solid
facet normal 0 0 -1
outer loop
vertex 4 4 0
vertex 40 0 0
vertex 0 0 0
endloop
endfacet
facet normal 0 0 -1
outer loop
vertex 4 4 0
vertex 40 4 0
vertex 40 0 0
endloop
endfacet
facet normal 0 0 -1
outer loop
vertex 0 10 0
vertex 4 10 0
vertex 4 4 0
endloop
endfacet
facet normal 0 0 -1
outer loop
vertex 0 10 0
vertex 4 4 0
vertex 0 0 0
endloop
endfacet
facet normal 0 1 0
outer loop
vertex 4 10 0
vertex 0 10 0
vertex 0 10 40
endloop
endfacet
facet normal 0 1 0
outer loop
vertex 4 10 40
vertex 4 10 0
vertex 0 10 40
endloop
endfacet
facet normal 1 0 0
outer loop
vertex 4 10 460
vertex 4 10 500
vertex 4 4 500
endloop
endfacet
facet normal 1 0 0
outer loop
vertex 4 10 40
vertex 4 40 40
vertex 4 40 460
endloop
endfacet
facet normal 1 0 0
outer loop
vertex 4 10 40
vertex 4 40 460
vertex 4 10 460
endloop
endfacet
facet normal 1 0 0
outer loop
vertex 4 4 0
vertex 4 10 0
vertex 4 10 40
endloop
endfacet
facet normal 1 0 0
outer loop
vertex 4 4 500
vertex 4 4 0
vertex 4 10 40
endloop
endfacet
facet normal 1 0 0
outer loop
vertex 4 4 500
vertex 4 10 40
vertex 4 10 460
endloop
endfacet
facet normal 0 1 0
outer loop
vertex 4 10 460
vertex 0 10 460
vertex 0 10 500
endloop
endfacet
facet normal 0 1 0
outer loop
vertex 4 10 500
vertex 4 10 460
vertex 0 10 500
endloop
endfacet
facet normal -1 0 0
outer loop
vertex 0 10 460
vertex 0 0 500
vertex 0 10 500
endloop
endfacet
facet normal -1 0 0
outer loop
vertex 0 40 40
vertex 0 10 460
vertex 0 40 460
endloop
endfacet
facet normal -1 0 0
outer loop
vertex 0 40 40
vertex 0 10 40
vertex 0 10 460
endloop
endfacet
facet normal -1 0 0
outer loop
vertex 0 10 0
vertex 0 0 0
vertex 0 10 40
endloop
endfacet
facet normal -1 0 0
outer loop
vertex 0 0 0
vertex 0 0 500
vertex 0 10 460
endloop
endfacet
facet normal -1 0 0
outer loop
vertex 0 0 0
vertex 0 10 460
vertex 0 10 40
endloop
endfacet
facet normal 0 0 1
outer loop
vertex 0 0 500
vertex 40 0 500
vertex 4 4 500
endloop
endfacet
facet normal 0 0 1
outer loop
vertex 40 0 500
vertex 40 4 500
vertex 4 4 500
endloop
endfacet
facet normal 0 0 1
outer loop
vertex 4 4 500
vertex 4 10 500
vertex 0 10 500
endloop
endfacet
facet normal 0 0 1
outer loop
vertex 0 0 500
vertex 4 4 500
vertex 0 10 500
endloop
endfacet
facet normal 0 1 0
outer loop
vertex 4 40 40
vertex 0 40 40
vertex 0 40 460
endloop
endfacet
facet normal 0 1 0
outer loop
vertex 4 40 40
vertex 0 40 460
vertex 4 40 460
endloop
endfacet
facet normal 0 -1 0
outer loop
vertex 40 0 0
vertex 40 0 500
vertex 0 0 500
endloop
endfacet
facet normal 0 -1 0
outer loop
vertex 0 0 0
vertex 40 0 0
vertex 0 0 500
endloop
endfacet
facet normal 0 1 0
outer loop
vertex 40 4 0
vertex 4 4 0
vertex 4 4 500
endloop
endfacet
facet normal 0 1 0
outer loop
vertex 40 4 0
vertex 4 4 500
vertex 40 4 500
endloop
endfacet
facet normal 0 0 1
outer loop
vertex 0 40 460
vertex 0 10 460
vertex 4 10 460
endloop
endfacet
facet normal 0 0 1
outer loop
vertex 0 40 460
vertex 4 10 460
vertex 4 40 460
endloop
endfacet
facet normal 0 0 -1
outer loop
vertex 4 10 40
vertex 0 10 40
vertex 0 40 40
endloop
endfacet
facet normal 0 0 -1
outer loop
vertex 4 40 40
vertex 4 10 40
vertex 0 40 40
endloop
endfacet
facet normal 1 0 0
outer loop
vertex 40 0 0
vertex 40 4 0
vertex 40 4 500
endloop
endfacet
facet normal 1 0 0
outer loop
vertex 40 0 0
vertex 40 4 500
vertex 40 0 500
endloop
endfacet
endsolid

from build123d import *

# Parameters (mm, degrees)
EXTRUDE_1_DEPTH     = 500
SKETCH_2_W          = 40
SKETCH_2_H          = 30
CUT_EXTRUDE_1_DEPTH = 504.189825016
SKETCH_3_W          = 40
SKETCH_3_H          = 30
CUT_EXTRUDE_2_DEPTH = 504.189825016


with BuildPart() as part:
    # Эскиз1 → Бобышка-Вытянуть1 (new body)
    with BuildSketch(Plane.XY):
        Polygon((0, 0), (0, 40), (4, 40), (4, 4), (40, 4), (40, 0), align=None)
    extrude(amount=EXTRUDE_1_DEPTH)

    # Эскиз2 → Вырез-Вытянуть1 (cut, through all)
    with BuildSketch(Plane.ZY):
        with Locations((20, 25)):
            Rectangle(SKETCH_2_W, SKETCH_2_H)
    extrude(amount=-CUT_EXTRUDE_1_DEPTH, mode=Mode.SUBTRACT)

    # Эскиз3 → Вырез-Вытянуть2 (cut, through all)
    with BuildSketch(Plane.ZY):
        with Locations((480, 25)):
            Rectangle(SKETCH_3_W, SKETCH_3_H)
    extrude(amount=-CUT_EXTRUDE_2_DEPTH, mode=Mode.SUBTRACT)


solid = part.part
